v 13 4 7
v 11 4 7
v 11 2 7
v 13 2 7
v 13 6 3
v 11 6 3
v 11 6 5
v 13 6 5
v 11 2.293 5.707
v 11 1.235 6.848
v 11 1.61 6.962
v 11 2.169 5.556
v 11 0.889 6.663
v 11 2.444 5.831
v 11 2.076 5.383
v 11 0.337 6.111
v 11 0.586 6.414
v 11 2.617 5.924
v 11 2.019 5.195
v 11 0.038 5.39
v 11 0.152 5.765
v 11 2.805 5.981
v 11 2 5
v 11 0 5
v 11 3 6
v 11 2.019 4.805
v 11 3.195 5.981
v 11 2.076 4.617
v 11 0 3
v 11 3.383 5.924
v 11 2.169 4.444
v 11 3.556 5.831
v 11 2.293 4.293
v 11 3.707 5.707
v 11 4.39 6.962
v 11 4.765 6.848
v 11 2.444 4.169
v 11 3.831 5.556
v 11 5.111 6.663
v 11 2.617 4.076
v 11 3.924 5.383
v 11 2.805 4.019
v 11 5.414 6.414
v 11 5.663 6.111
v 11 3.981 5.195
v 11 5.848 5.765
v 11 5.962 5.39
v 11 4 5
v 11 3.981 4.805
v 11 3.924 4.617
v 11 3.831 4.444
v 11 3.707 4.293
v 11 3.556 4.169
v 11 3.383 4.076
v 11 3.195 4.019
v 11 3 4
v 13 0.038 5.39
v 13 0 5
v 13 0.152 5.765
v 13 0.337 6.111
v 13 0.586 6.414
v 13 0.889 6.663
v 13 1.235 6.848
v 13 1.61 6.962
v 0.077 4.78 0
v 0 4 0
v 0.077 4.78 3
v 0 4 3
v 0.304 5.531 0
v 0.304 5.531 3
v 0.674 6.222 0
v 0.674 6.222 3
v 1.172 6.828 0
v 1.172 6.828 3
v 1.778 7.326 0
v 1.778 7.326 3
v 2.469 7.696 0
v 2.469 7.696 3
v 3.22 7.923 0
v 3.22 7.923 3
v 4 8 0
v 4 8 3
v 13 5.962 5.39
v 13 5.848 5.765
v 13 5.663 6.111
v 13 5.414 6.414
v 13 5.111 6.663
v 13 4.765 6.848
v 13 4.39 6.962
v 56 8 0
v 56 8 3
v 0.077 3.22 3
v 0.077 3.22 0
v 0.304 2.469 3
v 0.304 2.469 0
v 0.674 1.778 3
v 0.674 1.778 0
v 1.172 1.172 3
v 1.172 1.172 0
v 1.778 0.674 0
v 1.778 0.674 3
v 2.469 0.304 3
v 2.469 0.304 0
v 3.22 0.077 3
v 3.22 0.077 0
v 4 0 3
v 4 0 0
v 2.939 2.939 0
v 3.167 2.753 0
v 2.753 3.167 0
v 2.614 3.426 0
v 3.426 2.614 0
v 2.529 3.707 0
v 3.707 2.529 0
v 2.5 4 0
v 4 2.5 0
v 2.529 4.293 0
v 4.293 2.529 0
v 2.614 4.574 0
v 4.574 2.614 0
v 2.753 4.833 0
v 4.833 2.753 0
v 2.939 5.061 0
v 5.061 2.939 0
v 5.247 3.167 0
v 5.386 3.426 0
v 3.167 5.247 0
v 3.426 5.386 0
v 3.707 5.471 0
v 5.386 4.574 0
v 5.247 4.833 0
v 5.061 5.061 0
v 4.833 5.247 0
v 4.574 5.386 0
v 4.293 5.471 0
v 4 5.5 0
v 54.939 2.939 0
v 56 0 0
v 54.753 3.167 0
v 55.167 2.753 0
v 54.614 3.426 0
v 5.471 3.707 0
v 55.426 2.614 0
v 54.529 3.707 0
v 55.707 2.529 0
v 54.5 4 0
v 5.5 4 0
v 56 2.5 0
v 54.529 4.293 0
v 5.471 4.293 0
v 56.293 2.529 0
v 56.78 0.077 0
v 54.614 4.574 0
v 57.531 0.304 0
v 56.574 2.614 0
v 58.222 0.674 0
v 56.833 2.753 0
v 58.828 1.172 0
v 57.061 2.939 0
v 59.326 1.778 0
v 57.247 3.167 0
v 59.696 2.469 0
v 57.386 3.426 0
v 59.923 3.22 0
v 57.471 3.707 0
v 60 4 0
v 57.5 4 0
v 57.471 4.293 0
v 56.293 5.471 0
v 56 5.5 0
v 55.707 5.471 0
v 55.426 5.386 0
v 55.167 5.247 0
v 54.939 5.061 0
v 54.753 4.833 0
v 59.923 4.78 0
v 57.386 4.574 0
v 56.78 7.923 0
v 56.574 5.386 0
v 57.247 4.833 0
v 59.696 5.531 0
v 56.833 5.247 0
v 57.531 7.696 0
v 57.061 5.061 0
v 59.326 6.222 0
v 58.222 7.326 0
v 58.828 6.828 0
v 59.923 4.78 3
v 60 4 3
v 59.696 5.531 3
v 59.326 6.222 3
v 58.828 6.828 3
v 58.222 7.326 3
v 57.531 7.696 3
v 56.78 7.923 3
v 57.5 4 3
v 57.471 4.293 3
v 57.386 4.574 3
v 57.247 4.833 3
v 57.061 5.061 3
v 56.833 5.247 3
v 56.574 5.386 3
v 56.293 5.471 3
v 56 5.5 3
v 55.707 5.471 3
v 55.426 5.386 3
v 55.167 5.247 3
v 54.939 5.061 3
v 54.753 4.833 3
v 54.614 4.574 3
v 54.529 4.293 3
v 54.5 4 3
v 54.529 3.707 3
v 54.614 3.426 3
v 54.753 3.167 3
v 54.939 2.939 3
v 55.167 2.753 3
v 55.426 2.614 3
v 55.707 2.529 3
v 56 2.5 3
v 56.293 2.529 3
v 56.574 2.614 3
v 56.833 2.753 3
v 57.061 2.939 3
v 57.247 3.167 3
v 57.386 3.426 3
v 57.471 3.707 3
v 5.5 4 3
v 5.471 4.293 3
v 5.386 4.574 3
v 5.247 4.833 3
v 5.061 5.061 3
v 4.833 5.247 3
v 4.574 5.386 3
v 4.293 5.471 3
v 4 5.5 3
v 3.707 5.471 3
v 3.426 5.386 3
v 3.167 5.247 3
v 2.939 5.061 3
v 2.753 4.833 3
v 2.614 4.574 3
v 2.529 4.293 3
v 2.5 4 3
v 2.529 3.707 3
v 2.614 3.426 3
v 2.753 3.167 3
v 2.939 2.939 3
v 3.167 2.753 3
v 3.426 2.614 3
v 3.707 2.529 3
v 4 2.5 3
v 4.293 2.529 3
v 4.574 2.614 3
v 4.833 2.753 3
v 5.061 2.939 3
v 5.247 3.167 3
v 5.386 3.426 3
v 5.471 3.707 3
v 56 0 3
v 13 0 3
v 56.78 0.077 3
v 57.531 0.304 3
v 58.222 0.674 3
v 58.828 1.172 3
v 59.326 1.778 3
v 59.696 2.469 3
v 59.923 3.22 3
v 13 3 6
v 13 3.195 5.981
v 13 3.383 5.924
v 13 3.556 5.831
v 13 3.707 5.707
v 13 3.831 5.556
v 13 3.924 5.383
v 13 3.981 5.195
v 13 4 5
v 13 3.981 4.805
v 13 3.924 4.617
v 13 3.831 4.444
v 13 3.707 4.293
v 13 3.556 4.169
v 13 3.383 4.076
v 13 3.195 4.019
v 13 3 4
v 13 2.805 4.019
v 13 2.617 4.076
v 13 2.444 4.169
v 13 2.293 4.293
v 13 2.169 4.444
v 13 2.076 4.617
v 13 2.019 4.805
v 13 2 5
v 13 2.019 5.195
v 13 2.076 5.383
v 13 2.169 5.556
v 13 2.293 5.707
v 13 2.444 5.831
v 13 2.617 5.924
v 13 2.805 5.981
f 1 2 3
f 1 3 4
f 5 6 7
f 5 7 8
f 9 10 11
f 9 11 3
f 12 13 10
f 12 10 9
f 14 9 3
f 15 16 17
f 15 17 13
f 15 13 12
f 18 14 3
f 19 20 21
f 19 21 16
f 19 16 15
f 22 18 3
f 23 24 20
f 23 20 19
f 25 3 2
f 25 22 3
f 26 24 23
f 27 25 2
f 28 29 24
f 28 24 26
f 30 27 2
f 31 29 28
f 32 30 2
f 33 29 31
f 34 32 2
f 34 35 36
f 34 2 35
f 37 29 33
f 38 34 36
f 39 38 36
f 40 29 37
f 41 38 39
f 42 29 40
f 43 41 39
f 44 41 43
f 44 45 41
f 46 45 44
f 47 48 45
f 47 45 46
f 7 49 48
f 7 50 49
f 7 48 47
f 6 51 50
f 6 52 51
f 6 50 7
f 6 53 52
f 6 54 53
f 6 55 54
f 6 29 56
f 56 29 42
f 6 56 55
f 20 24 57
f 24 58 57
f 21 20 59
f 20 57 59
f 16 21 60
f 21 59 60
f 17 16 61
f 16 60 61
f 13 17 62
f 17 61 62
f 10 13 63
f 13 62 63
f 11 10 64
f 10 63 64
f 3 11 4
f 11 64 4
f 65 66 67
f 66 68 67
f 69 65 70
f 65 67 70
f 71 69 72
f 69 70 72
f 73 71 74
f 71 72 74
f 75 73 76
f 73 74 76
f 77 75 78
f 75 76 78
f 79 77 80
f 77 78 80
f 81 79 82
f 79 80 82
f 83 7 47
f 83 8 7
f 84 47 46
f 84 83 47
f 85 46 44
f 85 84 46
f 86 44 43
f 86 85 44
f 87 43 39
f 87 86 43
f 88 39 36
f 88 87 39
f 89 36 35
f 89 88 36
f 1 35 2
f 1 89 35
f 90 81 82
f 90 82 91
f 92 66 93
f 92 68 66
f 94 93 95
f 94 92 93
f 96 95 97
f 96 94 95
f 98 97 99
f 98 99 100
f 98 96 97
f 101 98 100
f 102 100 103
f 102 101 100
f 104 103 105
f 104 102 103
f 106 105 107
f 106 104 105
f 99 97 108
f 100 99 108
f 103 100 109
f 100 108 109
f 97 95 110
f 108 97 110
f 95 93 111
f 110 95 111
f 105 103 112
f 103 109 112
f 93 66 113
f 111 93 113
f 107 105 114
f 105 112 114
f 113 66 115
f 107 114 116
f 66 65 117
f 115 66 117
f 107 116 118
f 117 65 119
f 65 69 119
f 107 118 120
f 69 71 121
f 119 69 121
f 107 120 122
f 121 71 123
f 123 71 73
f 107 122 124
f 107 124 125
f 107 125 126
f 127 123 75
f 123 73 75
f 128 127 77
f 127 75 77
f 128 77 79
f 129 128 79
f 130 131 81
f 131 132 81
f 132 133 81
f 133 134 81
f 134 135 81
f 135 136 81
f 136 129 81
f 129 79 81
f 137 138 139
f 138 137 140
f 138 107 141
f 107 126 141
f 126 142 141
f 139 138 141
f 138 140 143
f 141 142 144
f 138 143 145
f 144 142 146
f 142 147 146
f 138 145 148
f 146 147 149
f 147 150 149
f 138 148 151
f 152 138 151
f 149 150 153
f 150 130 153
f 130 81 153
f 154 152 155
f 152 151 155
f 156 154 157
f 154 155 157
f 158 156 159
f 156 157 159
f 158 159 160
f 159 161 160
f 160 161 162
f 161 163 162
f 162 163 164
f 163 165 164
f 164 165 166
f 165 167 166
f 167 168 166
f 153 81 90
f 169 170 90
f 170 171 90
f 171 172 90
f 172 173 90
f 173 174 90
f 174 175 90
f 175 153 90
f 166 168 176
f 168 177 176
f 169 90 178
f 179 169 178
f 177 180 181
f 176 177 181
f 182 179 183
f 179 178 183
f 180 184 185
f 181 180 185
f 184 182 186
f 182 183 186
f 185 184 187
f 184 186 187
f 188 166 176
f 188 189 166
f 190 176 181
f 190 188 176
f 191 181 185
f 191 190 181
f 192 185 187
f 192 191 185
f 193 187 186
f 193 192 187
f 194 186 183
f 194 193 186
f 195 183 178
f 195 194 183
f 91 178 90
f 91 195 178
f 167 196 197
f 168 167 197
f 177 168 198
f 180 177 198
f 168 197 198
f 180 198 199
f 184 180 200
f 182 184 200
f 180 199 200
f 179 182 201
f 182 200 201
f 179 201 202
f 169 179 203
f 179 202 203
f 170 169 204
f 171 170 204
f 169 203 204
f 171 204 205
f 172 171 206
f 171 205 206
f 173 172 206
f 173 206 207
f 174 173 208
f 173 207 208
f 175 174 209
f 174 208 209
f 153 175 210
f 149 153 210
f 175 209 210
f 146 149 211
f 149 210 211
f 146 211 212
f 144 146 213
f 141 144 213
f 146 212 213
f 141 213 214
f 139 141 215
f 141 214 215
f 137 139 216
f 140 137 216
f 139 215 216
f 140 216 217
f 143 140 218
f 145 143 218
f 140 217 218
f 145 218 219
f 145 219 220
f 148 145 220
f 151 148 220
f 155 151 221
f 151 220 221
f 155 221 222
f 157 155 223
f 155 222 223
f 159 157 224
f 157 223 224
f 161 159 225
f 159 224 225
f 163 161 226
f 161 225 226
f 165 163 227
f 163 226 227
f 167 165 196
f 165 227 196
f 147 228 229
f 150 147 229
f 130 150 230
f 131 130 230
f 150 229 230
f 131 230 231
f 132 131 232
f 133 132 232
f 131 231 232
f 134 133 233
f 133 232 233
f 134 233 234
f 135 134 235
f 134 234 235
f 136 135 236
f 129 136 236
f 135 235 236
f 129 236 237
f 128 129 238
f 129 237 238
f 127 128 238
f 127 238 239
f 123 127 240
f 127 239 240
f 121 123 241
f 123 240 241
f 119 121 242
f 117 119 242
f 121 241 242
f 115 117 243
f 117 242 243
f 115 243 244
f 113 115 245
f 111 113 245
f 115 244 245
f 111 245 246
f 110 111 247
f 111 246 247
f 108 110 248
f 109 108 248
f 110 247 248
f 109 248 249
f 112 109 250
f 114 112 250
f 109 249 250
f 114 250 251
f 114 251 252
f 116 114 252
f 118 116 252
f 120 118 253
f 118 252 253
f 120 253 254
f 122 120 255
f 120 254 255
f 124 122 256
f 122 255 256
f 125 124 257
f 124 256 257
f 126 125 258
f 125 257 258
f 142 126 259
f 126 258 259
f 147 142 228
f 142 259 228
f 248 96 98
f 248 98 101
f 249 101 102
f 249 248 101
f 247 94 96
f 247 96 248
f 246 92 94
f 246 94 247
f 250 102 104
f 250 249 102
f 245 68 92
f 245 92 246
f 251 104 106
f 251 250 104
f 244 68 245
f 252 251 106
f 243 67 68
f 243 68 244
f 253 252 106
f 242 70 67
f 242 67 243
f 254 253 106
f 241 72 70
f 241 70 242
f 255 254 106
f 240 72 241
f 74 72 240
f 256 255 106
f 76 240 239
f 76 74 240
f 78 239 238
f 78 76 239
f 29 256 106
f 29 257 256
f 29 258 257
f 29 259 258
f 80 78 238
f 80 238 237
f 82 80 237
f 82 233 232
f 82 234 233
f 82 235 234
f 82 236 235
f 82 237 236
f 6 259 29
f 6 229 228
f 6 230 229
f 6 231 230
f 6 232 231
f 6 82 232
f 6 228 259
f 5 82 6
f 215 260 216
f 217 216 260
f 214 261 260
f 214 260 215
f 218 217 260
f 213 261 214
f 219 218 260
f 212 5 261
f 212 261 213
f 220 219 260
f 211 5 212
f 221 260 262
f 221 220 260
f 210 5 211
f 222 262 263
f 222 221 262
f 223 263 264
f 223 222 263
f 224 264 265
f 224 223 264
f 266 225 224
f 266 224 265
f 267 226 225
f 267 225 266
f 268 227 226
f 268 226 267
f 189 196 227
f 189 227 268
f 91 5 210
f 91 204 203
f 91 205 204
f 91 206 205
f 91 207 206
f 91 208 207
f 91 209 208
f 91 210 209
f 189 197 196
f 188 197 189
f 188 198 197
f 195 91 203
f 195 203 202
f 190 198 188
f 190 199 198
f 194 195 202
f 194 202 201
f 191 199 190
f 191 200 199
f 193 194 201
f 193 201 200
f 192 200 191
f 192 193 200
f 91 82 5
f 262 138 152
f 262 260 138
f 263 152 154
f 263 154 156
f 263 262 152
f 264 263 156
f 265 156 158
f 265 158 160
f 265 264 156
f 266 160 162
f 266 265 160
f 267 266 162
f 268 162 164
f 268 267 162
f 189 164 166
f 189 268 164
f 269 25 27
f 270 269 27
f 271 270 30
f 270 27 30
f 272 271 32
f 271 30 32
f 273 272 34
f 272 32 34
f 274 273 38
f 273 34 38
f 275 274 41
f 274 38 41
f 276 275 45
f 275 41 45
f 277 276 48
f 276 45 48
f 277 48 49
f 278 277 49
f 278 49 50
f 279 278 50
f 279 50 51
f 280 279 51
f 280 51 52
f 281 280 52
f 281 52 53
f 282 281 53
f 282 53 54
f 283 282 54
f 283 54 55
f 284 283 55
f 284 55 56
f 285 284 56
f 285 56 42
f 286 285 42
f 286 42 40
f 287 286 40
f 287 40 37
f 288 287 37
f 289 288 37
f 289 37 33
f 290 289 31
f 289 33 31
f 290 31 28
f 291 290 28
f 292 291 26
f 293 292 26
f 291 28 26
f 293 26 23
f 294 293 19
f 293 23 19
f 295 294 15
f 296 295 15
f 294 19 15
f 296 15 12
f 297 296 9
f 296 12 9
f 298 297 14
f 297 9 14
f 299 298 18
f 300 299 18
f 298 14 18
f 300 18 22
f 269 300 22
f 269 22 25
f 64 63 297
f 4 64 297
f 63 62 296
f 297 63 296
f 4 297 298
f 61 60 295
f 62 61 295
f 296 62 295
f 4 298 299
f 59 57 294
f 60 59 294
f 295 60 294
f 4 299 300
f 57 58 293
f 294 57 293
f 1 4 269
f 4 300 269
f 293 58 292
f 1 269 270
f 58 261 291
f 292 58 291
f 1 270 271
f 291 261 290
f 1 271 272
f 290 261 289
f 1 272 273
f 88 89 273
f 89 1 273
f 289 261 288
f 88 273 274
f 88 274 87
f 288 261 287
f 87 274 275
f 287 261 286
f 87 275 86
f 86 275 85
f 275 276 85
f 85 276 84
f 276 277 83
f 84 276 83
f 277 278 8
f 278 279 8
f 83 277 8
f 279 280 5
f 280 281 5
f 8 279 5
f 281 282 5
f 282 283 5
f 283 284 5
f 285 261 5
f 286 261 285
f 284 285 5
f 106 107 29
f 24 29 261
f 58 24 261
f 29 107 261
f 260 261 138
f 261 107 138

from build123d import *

# Parameters (mm, degrees)
SZKIC1_W                    = 60
SZKIC1_H                    = 8
DODANIE_WYCI_GNI_CIE1_DEPTH = 3
ZAOKR_GLENIE1_R             = 4
SZKIC2_R                    = 1.5
WYTNIJ_WYCI_GNI_CIE1_DEPTH  = 3
SZKIC3_W                    = 2
SZKIC3_H                    = 6
DODANIE_WYCI_GNI_CIE2_DEPTH = 4
WYTNIJ_WYCI_GNI_CIE2_REACH  = 52.14
SZKIC4_R                    = 1
ZAOKR_GLENIE2_R             = 2


with BuildPart() as part:
    # Szkic1 → Dodanie-wyciągnięcie1 (new body)
    with BuildSketch(Plane.XY):
        with Locations((30, 4)):
            Rectangle(SZKIC1_W, SZKIC1_H)
    extrude(amount=DODANIE_WYCI_GNI_CIE1_DEPTH)

    # Zaokrąglenie1
    zaokr_glenie1_edges = [part.edges().sort_by_distance(p)[0] for p in [
        (0, 0, 1.5),
        (0, 8, 1.5),
        (60, 8, 1.5),
        (60, 0, 1.5),
    ]]
    fillet(zaokr_glenie1_edges, radius=ZAOKR_GLENIE1_R - 0.0001)  # a hair under: the kernel refuses the full size

    # Szkic2 → Wytnij-wyciągnięcie1 (cut)
    with BuildSketch(Plane.XY.offset(3)):
        with Locations((4, 4)):
            Circle(SZKIC2_R)
        with Locations((56, 4)):
            Circle(SZKIC2_R)
    extrude(amount=-WYTNIJ_WYCI_GNI_CIE1_DEPTH, mode=Mode.SUBTRACT)

    # Szkic3 → Dodanie-wyciągnięcie2 (add)
    with BuildSketch(Plane.XY.offset(3)):
        with Locations((12, 3)):
            Rectangle(SZKIC3_W, SZKIC3_H)
    extrude(amount=DODANIE_WYCI_GNI_CIE2_DEPTH)

    # Szkic4 → Wytnij-wyciągnięcie2 (cut, up to next)
    with BuildSketch(Plane.ZY.offset(-11), mode=Mode.PRIVATE) as wytnij_wyci_gni_cie2_sk1:
        with Locations((5, 3)):
            Circle(SZKIC4_R)
    wytnij_wyci_gni_cie2_tool1 = extrude(wytnij_wyci_gni_cie2_sk1.sketch, amount=-WYTNIJ_WYCI_GNI_CIE2_REACH, mode=Mode.PRIVATE) & part.part
    add(wytnij_wyci_gni_cie2_tool1.solids().sort_by_distance((11, 3, 5))[0], mode=Mode.SUBTRACT)

    # Zaokrąglenie2
    zaokr_glenie2_edges = [part.edges().sort_by_distance(p)[0] for p in [
        (12, 0, 7),
        (12, 6, 7),
    ]]
    fillet(zaokr_glenie2_edges, radius=ZAOKR_GLENIE2_R)


solid = part.part
